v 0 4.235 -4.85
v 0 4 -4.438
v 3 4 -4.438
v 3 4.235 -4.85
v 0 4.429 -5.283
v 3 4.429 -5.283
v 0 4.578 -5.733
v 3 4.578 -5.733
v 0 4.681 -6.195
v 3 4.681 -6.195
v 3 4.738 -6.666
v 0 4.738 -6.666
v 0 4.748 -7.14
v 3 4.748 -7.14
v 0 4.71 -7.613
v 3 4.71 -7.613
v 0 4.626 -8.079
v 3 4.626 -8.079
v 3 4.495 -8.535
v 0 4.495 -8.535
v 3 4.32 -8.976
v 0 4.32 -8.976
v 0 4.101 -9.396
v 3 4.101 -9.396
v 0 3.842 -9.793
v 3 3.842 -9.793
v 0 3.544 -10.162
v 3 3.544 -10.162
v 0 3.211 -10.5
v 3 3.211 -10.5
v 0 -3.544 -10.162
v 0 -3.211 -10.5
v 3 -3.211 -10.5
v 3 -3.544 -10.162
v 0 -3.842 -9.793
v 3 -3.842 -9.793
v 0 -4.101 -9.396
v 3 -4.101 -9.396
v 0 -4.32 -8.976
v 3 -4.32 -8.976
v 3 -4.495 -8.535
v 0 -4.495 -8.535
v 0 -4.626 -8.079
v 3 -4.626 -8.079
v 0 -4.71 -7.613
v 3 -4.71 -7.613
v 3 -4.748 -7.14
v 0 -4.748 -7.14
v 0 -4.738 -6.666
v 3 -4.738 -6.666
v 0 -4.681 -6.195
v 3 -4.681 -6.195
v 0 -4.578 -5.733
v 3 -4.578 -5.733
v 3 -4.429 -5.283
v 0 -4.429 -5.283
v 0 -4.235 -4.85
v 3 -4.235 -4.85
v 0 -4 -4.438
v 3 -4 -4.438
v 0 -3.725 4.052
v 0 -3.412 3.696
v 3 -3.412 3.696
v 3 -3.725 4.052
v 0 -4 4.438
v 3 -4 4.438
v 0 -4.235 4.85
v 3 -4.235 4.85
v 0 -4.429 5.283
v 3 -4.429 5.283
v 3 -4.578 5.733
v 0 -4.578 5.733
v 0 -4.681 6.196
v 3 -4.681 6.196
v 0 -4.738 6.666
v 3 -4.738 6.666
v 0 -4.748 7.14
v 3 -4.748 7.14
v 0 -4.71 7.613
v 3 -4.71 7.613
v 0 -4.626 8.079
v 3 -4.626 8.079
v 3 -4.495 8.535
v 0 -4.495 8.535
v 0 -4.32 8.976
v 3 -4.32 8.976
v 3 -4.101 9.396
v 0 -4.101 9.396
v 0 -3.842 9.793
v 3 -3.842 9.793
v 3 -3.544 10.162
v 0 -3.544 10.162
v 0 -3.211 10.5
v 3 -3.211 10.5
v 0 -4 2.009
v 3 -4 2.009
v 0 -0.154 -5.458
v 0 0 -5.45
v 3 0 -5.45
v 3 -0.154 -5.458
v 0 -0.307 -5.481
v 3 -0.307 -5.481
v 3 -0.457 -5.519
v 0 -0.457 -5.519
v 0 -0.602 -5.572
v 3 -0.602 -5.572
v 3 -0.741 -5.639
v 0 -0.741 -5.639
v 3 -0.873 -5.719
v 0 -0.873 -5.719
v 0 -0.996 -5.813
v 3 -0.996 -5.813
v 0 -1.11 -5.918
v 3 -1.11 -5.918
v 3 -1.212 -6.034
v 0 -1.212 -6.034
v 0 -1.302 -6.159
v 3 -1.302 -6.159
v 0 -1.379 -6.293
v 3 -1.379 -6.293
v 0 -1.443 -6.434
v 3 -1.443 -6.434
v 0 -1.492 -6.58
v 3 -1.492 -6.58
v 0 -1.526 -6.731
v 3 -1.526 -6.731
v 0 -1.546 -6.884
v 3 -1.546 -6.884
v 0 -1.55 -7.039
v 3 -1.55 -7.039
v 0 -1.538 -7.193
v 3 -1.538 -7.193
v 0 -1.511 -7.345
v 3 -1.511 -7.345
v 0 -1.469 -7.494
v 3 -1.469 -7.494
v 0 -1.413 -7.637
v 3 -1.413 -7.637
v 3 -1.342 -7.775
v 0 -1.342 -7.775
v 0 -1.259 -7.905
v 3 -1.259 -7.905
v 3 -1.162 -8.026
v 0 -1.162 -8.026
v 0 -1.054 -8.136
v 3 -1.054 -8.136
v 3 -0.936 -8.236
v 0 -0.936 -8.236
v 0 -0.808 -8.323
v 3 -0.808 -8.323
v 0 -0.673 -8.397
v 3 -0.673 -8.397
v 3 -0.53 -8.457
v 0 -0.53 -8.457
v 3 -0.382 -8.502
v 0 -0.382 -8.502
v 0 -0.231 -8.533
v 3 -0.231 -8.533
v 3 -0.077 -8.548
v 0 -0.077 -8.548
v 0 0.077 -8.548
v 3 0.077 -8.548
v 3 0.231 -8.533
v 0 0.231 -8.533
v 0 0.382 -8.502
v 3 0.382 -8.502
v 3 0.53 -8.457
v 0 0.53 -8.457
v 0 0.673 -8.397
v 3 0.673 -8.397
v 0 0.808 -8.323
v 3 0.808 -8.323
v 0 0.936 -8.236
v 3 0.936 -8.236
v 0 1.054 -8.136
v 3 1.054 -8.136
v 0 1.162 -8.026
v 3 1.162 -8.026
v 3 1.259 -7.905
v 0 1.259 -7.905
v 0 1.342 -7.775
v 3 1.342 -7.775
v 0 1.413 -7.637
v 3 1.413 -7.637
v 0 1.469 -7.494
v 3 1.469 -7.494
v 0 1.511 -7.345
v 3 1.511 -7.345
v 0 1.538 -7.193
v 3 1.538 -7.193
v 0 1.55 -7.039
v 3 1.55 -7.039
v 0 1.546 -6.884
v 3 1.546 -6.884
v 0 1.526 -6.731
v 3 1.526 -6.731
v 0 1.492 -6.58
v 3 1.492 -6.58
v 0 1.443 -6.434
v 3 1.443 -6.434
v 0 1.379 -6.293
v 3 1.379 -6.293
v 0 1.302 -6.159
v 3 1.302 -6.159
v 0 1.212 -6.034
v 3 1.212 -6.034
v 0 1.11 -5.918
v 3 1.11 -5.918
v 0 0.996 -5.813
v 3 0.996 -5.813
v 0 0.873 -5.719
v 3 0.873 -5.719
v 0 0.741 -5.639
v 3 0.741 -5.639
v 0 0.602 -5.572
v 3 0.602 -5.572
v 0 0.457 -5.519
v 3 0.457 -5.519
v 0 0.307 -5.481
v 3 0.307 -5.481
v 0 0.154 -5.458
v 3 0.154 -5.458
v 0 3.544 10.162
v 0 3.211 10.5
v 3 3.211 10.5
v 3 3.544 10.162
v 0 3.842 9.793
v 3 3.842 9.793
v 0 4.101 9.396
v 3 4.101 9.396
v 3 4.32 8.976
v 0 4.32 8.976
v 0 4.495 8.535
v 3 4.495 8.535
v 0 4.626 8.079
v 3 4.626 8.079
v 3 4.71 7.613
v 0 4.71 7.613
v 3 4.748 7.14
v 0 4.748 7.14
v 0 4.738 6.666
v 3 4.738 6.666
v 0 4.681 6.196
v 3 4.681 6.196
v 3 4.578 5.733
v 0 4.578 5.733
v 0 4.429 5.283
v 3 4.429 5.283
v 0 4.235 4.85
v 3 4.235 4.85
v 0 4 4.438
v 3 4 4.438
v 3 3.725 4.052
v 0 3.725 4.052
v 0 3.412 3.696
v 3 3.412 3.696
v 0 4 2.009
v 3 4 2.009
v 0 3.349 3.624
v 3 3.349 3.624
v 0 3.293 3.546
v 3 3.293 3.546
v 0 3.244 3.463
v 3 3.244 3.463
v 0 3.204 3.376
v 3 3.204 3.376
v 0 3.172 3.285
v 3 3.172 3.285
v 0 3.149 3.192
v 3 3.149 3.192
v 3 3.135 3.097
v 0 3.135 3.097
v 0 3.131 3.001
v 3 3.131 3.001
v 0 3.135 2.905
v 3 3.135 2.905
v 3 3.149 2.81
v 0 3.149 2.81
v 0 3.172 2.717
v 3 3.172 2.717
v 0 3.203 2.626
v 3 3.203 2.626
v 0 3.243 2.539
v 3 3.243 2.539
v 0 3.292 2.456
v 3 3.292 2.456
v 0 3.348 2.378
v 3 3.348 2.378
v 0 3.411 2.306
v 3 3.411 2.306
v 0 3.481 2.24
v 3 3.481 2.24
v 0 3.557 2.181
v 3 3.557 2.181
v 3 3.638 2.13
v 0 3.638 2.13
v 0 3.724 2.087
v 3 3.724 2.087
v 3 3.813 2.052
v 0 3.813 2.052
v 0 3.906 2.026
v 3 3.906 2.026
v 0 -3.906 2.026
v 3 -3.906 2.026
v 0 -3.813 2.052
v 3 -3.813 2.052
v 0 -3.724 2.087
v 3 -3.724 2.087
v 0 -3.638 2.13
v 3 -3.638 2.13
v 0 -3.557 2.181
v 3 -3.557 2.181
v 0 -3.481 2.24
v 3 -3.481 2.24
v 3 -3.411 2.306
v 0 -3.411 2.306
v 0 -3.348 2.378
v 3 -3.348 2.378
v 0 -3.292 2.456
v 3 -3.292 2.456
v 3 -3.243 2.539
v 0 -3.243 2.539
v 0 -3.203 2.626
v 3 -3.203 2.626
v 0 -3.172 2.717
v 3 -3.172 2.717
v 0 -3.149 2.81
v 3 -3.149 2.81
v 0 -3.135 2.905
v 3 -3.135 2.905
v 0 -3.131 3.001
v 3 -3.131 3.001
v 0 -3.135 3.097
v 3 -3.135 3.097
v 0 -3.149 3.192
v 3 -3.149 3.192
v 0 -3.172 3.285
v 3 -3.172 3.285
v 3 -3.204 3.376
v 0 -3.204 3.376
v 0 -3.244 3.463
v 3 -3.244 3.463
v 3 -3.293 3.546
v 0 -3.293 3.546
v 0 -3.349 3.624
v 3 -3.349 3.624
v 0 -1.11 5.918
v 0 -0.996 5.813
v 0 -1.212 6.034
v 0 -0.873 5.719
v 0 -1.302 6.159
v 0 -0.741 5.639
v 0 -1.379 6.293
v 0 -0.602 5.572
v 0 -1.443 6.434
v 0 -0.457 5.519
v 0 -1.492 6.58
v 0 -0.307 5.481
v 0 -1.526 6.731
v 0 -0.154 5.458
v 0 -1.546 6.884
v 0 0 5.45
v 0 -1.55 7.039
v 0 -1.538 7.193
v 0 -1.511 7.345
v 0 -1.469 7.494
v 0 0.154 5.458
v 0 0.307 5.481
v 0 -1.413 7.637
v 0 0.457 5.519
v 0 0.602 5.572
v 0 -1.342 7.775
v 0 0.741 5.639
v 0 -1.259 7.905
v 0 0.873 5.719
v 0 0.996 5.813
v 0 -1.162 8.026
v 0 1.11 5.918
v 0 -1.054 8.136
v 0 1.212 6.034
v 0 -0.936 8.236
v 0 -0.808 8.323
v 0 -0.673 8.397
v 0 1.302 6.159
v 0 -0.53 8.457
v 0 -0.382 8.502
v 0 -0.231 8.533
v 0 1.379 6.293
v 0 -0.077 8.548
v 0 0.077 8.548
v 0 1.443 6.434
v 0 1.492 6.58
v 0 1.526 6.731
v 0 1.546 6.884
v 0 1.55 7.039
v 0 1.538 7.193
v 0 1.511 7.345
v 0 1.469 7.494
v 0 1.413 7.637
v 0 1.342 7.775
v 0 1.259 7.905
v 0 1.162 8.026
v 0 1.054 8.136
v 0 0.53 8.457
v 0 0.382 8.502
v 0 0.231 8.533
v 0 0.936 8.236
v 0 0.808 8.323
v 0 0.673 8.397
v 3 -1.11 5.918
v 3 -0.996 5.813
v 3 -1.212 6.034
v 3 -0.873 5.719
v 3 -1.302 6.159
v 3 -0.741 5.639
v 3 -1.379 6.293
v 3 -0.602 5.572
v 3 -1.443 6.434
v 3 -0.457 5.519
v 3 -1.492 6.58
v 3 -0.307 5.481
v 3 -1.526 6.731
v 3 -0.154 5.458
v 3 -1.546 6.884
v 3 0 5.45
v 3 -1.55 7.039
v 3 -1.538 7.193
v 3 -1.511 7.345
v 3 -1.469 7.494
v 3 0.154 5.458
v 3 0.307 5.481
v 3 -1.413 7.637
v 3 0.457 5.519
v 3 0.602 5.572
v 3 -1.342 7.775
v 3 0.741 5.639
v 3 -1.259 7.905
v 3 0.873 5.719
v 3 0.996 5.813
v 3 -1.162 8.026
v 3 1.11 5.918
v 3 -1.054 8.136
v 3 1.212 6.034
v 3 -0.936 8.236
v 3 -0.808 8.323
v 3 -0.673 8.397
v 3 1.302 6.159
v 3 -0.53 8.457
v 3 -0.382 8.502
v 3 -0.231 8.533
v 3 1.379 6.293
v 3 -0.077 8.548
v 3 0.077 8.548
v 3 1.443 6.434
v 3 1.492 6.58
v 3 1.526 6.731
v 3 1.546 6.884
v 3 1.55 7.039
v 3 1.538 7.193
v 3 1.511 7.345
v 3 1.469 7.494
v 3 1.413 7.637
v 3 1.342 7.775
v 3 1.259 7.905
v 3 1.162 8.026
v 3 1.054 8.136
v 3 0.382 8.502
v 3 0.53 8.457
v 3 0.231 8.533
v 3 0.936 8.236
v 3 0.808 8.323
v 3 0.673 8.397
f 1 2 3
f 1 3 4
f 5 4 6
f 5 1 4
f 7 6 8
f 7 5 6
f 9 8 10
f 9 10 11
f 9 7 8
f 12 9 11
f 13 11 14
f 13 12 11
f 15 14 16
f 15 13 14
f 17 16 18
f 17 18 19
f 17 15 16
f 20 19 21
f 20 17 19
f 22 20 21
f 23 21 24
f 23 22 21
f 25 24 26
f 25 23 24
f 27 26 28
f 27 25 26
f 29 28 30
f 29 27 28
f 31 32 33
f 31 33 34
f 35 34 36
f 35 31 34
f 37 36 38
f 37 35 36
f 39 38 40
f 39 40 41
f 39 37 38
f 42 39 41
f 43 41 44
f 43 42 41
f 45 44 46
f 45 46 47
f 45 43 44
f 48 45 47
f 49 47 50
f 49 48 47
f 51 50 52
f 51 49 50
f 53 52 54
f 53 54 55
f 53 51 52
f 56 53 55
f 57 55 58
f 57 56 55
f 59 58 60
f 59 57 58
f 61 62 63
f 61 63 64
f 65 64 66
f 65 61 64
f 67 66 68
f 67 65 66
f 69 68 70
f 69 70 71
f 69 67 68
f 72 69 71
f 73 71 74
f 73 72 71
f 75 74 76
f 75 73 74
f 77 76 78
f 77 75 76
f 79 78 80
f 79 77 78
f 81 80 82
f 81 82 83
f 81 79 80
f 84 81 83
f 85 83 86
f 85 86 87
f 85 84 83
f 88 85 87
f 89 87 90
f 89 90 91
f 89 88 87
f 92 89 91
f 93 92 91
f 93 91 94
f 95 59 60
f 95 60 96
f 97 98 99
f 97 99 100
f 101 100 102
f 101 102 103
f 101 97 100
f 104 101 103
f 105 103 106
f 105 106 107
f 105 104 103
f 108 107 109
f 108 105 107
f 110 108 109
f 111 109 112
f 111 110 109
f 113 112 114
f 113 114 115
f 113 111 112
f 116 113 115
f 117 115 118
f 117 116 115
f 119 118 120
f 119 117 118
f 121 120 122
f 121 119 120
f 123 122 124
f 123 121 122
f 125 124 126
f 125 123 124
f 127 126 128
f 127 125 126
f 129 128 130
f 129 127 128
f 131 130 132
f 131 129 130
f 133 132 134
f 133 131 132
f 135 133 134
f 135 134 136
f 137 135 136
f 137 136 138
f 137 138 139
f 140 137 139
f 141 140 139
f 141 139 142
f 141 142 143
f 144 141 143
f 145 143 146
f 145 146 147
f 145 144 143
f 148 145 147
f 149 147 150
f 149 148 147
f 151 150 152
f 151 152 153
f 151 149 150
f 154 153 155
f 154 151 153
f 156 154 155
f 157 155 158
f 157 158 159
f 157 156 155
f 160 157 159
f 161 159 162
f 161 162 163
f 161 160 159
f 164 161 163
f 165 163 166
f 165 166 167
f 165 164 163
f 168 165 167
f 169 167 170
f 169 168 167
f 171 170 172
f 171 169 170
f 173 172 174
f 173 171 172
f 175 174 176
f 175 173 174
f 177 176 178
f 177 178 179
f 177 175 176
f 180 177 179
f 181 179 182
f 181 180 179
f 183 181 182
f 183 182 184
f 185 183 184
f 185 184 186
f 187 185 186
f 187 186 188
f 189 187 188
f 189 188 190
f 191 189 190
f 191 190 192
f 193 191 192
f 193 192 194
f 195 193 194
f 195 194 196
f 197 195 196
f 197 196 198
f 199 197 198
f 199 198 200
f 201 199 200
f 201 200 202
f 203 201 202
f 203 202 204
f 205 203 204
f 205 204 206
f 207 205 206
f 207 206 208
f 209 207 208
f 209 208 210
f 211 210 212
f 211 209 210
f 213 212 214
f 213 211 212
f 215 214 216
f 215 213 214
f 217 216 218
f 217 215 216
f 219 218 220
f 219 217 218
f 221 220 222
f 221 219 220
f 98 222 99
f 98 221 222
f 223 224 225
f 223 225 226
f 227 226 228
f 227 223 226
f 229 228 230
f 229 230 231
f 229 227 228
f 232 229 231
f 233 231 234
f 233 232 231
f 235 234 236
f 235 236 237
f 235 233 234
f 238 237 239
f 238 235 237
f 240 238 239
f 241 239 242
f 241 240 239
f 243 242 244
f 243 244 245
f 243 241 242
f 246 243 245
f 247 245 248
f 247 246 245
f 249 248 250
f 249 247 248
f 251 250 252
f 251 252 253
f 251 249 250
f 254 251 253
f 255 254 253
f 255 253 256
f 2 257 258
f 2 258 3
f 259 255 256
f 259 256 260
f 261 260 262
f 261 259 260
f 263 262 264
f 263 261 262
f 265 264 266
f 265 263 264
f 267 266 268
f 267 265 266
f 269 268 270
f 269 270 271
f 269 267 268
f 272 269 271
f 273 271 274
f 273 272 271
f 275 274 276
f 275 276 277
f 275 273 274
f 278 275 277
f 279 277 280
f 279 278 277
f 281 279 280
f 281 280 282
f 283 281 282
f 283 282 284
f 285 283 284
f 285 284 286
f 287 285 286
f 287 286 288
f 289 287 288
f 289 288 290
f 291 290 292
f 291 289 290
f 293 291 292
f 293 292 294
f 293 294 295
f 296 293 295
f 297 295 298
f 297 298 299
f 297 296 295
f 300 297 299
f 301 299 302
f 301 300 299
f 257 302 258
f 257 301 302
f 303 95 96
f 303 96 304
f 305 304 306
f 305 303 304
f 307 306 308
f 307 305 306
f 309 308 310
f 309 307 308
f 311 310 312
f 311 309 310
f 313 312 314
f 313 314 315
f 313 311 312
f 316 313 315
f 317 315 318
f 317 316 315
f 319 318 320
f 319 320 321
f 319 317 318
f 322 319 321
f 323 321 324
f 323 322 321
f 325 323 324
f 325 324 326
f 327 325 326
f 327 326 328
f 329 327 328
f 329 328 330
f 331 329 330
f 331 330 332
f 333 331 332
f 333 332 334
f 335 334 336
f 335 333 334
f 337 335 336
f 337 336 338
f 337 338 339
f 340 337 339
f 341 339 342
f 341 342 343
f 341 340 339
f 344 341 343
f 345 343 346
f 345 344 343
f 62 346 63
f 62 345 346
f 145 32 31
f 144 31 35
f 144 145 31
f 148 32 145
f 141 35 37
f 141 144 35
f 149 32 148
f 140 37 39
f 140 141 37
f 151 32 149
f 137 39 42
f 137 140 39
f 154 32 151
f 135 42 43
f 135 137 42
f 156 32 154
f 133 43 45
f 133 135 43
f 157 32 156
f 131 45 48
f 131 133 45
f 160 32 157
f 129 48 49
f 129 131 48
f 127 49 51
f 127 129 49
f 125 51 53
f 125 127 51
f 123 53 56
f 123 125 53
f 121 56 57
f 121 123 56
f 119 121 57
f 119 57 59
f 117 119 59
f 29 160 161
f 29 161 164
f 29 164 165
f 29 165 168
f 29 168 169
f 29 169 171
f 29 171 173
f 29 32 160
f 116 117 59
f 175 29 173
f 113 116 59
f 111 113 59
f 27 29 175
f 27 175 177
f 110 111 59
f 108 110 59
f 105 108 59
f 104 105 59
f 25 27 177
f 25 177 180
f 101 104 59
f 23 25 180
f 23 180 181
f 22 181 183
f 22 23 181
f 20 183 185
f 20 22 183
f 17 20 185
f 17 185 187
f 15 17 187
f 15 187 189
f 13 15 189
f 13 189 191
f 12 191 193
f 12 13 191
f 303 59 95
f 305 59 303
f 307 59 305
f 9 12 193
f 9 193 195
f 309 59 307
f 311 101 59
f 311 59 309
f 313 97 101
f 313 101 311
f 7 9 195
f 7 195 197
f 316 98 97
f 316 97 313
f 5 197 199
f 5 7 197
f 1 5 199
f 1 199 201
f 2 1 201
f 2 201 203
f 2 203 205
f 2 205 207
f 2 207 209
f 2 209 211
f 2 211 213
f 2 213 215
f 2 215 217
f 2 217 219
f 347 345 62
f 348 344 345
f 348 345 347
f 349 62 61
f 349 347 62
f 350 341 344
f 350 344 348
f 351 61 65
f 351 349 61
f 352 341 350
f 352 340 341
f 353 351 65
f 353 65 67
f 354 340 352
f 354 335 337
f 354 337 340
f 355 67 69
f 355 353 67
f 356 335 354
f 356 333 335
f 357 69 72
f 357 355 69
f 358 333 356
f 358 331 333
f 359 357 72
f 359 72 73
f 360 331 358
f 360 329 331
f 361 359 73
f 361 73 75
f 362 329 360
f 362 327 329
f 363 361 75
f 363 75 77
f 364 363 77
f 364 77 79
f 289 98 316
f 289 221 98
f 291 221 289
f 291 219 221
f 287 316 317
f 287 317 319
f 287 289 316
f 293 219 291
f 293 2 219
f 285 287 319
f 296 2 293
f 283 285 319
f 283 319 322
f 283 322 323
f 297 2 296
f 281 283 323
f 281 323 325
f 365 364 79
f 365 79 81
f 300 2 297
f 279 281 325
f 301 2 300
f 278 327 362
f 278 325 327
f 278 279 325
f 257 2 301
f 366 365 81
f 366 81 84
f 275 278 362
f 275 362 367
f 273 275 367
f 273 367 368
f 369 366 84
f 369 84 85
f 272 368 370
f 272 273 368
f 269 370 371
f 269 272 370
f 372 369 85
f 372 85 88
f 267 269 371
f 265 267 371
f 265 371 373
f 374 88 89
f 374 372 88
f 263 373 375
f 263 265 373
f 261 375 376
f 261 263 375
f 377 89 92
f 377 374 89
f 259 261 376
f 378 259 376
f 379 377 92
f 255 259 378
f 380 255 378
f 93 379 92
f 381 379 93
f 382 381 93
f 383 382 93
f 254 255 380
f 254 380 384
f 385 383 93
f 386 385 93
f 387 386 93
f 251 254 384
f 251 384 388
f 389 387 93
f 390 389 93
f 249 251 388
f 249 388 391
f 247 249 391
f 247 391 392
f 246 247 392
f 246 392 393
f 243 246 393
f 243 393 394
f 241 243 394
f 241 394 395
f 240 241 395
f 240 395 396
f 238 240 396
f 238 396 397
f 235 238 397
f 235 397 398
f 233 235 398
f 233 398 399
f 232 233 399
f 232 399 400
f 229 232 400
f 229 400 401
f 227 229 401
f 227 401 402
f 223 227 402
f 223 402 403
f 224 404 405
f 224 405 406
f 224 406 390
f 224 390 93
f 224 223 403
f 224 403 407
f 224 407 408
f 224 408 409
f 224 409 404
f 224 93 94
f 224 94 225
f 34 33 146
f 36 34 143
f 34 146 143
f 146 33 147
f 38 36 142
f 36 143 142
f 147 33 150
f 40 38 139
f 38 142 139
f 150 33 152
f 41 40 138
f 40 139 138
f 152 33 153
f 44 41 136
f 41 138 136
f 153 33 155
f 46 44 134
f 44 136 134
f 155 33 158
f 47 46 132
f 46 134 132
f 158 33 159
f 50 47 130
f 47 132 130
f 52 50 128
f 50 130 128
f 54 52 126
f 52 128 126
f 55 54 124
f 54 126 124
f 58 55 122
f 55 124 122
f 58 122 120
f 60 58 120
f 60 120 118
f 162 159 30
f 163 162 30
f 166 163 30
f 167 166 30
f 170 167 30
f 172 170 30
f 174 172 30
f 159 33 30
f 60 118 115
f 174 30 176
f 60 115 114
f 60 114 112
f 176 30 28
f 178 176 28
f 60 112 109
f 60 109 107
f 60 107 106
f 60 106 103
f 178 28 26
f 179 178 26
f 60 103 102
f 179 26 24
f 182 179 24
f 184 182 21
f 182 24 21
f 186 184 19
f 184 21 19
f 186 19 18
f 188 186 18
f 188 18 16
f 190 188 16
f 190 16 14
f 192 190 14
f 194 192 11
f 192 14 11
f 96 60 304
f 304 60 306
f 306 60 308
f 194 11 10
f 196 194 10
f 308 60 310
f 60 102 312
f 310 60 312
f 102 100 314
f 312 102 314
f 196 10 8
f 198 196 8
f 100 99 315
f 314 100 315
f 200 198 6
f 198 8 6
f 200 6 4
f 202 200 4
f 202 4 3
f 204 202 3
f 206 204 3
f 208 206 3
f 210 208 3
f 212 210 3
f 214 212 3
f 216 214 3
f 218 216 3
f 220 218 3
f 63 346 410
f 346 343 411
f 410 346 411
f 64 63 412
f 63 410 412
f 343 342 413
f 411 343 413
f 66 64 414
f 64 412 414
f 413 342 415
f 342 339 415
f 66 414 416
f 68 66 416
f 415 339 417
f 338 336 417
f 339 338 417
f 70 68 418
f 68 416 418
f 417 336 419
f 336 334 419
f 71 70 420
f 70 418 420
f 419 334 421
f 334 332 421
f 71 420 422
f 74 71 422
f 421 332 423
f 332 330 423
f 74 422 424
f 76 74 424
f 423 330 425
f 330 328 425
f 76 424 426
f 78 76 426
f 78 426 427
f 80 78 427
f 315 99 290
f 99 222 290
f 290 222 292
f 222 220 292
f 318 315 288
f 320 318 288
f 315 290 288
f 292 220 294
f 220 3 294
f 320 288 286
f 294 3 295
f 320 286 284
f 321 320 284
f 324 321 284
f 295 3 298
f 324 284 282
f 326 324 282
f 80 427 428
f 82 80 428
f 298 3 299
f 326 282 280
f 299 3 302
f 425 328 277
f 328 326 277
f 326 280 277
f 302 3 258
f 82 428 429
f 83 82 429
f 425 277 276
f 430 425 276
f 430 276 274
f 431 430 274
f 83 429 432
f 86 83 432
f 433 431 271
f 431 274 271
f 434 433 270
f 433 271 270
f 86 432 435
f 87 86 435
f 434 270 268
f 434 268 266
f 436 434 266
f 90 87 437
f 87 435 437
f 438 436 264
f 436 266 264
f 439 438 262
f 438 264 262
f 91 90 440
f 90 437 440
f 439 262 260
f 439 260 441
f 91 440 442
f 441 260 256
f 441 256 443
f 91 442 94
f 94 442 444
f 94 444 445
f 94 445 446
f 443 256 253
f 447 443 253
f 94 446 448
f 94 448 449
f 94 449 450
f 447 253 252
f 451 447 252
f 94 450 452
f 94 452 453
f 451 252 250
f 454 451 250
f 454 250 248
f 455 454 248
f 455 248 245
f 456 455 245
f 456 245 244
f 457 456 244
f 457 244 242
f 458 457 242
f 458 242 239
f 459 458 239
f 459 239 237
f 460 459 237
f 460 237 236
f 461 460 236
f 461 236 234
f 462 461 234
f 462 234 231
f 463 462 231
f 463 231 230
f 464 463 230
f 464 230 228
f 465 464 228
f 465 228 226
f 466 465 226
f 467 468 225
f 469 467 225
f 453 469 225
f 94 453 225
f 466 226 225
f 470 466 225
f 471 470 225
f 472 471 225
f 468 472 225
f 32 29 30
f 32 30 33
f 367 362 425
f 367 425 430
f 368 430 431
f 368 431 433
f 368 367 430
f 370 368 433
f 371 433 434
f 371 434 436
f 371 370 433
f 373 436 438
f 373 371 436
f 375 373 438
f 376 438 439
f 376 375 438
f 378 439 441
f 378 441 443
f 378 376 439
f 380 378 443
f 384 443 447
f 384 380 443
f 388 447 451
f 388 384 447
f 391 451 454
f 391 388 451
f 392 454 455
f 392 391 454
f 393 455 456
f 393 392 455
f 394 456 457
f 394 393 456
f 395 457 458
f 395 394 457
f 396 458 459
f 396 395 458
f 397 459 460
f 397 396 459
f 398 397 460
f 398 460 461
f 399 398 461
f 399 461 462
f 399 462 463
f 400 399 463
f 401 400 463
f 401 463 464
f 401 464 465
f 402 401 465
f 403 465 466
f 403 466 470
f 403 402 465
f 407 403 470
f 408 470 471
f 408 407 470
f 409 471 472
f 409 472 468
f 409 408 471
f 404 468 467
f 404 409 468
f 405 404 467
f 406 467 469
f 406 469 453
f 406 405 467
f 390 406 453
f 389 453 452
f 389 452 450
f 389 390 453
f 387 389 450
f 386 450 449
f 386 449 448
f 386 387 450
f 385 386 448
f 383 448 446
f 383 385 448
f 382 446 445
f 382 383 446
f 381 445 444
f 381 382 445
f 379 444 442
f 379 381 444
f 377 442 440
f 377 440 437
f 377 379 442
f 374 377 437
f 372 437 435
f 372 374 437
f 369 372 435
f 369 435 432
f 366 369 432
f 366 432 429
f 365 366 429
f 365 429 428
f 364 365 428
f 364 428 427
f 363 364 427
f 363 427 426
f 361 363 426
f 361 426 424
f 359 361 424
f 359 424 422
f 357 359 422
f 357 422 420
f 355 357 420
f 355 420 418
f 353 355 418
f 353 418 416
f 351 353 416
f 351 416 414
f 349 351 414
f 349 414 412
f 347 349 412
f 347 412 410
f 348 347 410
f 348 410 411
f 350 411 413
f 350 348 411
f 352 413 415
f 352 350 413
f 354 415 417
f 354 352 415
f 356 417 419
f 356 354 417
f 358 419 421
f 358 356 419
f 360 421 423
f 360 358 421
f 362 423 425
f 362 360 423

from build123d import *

# Parameters (mm, degrees)
SKETCH_1_R      = 1.55
EXTRUDE_1_DEPTH = 3


with BuildPart() as part:
    # 草图1 → 凸台-拉伸1 (new body)
    with BuildSketch(Plane(origin=(0, 0, 0), x_dir=(0, 0, -1), z_dir=(1, 0, 0))):
        with BuildLine():
            Line((-2.008575125, 4), (4.438262309, 4))
            ThreePointArc((4.438262309, 4), (7.612856223, 4.710298), (10.5, 3.211308145))
            Line((10.5, 3.211308145), (10.5, -3.211308145))
            ThreePointArc((10.5, -3.211308145), (7.612856223, -4.710298), (4.438262309, -4))
            Line((4.438262309, -4), (-2.008575125, -4))
            ThreePointArc((-2.008575125, -4), (-2.671034277, -3.186336048), (-3.695652174, -3.412299143))
            ThreePointArc((-3.695652174, -3.412299143), (-7.140247241, -4.747929097), (-10.5, -3.211308145))
            Line((-10.5, -3.211308145), (-10.5, 3.211308145))
            ThreePointArc((-10.5, 3.211308145), (-7.140247241, 4.747929097), (-3.695652174, 3.412299143))
            ThreePointArc((-3.695652174, 3.412299143), (-2.671034277, 3.186336048), (-2.008575125, 4))
        make_face()
        with Locations((-7, 0)):
            Circle(SKETCH_1_R, mode=Mode.SUBTRACT)
        with Locations(Location((7, 0, 0), (0, 0, 180))):
            Circle(SKETCH_1_R, mode=Mode.SUBTRACT)
    extrude(amount=EXTRUDE_1_DEPTH)


solid = part.part
